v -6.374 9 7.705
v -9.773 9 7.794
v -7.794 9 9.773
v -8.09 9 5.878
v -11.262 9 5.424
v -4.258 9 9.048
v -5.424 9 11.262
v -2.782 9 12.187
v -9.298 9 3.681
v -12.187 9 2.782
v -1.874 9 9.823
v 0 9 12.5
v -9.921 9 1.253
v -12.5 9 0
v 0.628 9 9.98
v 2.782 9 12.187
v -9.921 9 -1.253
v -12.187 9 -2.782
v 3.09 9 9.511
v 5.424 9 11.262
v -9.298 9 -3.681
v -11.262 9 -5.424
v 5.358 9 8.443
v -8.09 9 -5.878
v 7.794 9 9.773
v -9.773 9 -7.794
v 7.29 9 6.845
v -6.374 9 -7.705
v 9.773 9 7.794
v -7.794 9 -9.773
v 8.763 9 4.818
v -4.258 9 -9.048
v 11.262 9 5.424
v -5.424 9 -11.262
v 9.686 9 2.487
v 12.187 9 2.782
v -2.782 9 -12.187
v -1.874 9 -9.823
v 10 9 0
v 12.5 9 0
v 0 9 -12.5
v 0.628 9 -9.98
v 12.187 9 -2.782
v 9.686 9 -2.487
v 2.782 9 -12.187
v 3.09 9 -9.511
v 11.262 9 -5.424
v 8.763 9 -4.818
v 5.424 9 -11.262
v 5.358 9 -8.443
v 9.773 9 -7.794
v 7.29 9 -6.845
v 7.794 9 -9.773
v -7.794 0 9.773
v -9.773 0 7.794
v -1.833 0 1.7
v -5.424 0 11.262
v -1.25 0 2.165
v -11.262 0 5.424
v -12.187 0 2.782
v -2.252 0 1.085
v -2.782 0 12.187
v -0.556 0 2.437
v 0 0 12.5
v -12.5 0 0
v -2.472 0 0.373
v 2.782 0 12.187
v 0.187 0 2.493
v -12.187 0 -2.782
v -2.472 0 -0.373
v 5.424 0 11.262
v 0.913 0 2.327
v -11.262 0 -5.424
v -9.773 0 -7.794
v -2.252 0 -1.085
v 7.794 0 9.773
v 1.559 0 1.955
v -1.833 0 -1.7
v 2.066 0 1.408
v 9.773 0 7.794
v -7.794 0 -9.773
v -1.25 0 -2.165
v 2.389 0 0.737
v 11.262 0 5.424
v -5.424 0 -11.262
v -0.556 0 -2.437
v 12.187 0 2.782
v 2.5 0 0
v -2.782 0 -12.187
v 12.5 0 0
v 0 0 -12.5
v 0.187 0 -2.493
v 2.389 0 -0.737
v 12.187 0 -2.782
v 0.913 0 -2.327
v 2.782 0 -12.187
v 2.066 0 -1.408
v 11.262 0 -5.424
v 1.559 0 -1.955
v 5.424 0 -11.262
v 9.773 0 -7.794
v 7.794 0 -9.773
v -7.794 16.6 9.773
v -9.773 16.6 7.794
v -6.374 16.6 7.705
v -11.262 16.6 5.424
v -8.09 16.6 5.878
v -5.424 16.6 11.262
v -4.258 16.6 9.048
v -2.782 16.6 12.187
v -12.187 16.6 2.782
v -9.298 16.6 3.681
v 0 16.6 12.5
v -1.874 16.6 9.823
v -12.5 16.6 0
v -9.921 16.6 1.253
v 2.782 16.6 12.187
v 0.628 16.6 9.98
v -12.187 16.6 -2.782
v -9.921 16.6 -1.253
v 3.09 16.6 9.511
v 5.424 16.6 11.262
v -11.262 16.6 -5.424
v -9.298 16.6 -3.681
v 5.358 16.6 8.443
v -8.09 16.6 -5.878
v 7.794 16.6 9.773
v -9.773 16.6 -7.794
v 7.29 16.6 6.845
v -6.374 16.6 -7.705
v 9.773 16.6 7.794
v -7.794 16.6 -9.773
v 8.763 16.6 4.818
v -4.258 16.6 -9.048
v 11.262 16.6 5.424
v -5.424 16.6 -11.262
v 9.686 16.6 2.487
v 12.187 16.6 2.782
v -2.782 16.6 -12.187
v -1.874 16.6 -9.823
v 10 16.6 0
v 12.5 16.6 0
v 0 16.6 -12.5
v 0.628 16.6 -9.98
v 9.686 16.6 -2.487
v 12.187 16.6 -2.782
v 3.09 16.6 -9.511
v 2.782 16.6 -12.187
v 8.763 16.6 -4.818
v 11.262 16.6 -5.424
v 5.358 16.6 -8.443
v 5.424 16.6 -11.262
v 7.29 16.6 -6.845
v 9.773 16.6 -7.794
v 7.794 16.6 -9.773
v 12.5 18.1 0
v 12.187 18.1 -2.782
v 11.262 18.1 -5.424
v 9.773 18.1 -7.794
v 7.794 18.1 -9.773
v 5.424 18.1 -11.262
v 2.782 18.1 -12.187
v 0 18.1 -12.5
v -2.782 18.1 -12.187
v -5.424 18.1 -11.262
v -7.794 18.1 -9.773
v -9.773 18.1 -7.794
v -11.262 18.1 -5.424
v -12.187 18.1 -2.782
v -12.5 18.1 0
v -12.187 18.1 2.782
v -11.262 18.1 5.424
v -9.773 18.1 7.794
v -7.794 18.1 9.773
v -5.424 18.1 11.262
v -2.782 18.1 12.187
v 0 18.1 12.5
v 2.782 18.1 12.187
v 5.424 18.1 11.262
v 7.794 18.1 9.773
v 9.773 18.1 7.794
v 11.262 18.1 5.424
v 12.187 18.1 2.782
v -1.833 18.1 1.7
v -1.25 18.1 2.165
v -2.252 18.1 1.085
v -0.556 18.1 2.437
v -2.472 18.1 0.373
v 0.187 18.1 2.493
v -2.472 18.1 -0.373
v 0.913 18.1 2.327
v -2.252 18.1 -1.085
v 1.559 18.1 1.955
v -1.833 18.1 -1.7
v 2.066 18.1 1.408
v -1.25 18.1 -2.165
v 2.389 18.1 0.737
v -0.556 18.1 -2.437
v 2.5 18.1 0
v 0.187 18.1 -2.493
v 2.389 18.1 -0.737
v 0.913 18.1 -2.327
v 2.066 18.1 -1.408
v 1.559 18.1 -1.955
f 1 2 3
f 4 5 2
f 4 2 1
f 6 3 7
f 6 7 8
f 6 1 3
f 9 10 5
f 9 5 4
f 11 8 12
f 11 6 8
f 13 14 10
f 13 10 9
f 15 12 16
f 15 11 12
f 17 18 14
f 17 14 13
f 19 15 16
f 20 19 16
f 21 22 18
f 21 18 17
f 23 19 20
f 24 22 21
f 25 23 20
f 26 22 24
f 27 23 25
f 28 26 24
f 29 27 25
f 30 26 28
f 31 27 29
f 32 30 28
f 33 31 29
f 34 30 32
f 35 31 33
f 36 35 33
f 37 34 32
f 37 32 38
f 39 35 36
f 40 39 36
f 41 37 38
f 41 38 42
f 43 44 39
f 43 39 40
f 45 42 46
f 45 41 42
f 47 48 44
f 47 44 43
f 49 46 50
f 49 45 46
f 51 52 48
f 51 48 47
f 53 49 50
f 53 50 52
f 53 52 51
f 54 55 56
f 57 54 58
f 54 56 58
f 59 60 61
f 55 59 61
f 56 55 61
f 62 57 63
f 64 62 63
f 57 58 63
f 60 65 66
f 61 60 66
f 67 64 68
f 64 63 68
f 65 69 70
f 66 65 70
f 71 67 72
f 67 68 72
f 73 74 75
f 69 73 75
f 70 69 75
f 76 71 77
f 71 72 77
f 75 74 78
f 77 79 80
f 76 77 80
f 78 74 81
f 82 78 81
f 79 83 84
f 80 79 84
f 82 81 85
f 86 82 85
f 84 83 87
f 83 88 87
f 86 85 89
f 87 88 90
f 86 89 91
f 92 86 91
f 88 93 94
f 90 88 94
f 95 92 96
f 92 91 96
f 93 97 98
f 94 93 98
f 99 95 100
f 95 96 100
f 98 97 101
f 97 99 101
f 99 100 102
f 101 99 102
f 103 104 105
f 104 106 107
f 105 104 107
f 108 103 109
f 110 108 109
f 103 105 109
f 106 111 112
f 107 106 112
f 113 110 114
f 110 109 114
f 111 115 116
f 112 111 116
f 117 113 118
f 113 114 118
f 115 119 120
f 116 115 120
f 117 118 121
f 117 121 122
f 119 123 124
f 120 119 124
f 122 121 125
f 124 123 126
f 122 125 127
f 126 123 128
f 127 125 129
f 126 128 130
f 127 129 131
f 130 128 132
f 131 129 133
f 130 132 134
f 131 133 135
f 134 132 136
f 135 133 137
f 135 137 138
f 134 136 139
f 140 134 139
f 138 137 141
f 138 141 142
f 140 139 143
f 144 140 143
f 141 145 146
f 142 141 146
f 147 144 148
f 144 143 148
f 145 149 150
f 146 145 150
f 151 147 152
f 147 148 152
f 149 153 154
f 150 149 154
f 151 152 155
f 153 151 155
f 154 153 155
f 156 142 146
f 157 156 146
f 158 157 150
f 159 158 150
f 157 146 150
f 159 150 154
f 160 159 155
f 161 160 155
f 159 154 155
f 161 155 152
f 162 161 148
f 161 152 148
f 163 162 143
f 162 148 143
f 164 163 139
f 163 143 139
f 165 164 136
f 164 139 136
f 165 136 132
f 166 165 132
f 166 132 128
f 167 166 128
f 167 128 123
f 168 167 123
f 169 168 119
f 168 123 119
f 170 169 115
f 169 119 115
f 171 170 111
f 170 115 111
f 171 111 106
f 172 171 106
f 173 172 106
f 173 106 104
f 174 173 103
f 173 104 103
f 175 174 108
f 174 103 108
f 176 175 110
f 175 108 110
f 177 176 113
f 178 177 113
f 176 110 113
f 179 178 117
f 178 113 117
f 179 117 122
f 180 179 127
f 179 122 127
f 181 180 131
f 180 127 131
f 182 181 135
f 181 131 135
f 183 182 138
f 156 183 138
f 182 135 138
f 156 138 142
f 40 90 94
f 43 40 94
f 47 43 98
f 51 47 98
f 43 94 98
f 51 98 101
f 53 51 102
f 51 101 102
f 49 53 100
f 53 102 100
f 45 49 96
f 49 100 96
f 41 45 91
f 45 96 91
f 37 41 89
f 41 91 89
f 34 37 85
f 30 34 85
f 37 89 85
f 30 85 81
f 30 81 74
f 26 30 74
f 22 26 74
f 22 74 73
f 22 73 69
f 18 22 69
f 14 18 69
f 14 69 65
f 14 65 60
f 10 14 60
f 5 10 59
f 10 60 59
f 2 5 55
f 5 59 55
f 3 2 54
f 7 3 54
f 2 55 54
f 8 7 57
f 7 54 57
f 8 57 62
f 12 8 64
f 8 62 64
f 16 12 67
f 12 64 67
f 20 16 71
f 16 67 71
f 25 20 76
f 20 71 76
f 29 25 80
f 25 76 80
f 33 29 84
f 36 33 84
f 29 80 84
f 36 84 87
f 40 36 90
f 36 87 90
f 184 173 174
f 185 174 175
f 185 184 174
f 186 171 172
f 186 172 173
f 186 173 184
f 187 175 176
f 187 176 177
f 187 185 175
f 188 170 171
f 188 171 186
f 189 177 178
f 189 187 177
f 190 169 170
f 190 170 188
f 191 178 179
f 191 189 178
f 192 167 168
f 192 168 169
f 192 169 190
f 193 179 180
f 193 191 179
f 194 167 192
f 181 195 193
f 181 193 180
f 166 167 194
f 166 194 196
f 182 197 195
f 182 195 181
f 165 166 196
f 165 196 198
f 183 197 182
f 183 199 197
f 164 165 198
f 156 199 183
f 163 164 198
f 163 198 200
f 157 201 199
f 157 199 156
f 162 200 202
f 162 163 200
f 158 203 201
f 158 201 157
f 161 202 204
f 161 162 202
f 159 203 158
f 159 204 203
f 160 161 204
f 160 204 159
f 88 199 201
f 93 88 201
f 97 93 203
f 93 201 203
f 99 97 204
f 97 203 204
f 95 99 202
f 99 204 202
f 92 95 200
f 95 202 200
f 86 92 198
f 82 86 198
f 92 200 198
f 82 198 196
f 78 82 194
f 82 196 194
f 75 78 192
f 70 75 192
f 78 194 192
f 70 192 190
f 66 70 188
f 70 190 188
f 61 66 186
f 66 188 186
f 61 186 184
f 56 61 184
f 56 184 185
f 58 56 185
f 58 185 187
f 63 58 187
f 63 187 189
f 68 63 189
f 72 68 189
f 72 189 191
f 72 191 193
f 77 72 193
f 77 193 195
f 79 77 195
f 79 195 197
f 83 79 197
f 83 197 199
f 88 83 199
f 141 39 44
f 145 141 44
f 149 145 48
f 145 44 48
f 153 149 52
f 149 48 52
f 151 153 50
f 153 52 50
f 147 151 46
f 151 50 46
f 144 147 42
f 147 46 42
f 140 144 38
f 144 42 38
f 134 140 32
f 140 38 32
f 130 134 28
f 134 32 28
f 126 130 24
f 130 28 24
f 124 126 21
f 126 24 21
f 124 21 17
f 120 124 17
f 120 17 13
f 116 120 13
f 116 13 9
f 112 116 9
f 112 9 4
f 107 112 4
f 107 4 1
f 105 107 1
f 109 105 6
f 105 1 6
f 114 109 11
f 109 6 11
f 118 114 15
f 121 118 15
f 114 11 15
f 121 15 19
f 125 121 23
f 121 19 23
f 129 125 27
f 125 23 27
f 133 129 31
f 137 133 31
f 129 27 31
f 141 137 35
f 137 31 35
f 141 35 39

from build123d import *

# Parameters (mm, degrees)
SKETCH1_R           = 12.5
BOSS_EXTRUDE1_DEPTH = 9
SKETCH2_R           = 10
BOSS_EXTRUDE2_DEPTH = 7.6
SKETCH3_R           = 12.5
BOSS_EXTRUDE3_DEPTH = 1.5
SKETCH4_R           = 2.5
CUT_EXTRUDE1_DEPTH  = 19.1


with BuildPart() as part:
    # Sketch1 → Boss-Extrude1 (new body)
    with BuildSketch(Plane(origin=(0, 0, 0), x_dir=(1, 0, 0), z_dir=(0, 1, 0))):
        Circle(SKETCH1_R)
    extrude(amount=BOSS_EXTRUDE1_DEPTH)

    # Sketch2 → Boss-Extrude2 (add)
    with BuildSketch(Plane(origin=(0, 9, 0), x_dir=(1, 0, 0), z_dir=(0, 1, 0))):
        Circle(SKETCH2_R)
    extrude(amount=BOSS_EXTRUDE2_DEPTH)

    # Sketch3 → Boss-Extrude3 (add)
    with BuildSketch(Plane(origin=(0, 16.6, 0), x_dir=(1, 0, 0), z_dir=(0, 1, 0))):
        Circle(SKETCH3_R)
    extrude(amount=BOSS_EXTRUDE3_DEPTH)

    # Sketch4 → Cut-Extrude1 (cut, through all)
    with BuildSketch(Plane(origin=(0, 18.1, 0), x_dir=(1, 0, 0), z_dir=(0, 1, 0))):
        Circle(SKETCH4_R)
    extrude(amount=-CUT_EXTRUDE1_DEPTH, mode=Mode.SUBTRACT)


solid = part.part
